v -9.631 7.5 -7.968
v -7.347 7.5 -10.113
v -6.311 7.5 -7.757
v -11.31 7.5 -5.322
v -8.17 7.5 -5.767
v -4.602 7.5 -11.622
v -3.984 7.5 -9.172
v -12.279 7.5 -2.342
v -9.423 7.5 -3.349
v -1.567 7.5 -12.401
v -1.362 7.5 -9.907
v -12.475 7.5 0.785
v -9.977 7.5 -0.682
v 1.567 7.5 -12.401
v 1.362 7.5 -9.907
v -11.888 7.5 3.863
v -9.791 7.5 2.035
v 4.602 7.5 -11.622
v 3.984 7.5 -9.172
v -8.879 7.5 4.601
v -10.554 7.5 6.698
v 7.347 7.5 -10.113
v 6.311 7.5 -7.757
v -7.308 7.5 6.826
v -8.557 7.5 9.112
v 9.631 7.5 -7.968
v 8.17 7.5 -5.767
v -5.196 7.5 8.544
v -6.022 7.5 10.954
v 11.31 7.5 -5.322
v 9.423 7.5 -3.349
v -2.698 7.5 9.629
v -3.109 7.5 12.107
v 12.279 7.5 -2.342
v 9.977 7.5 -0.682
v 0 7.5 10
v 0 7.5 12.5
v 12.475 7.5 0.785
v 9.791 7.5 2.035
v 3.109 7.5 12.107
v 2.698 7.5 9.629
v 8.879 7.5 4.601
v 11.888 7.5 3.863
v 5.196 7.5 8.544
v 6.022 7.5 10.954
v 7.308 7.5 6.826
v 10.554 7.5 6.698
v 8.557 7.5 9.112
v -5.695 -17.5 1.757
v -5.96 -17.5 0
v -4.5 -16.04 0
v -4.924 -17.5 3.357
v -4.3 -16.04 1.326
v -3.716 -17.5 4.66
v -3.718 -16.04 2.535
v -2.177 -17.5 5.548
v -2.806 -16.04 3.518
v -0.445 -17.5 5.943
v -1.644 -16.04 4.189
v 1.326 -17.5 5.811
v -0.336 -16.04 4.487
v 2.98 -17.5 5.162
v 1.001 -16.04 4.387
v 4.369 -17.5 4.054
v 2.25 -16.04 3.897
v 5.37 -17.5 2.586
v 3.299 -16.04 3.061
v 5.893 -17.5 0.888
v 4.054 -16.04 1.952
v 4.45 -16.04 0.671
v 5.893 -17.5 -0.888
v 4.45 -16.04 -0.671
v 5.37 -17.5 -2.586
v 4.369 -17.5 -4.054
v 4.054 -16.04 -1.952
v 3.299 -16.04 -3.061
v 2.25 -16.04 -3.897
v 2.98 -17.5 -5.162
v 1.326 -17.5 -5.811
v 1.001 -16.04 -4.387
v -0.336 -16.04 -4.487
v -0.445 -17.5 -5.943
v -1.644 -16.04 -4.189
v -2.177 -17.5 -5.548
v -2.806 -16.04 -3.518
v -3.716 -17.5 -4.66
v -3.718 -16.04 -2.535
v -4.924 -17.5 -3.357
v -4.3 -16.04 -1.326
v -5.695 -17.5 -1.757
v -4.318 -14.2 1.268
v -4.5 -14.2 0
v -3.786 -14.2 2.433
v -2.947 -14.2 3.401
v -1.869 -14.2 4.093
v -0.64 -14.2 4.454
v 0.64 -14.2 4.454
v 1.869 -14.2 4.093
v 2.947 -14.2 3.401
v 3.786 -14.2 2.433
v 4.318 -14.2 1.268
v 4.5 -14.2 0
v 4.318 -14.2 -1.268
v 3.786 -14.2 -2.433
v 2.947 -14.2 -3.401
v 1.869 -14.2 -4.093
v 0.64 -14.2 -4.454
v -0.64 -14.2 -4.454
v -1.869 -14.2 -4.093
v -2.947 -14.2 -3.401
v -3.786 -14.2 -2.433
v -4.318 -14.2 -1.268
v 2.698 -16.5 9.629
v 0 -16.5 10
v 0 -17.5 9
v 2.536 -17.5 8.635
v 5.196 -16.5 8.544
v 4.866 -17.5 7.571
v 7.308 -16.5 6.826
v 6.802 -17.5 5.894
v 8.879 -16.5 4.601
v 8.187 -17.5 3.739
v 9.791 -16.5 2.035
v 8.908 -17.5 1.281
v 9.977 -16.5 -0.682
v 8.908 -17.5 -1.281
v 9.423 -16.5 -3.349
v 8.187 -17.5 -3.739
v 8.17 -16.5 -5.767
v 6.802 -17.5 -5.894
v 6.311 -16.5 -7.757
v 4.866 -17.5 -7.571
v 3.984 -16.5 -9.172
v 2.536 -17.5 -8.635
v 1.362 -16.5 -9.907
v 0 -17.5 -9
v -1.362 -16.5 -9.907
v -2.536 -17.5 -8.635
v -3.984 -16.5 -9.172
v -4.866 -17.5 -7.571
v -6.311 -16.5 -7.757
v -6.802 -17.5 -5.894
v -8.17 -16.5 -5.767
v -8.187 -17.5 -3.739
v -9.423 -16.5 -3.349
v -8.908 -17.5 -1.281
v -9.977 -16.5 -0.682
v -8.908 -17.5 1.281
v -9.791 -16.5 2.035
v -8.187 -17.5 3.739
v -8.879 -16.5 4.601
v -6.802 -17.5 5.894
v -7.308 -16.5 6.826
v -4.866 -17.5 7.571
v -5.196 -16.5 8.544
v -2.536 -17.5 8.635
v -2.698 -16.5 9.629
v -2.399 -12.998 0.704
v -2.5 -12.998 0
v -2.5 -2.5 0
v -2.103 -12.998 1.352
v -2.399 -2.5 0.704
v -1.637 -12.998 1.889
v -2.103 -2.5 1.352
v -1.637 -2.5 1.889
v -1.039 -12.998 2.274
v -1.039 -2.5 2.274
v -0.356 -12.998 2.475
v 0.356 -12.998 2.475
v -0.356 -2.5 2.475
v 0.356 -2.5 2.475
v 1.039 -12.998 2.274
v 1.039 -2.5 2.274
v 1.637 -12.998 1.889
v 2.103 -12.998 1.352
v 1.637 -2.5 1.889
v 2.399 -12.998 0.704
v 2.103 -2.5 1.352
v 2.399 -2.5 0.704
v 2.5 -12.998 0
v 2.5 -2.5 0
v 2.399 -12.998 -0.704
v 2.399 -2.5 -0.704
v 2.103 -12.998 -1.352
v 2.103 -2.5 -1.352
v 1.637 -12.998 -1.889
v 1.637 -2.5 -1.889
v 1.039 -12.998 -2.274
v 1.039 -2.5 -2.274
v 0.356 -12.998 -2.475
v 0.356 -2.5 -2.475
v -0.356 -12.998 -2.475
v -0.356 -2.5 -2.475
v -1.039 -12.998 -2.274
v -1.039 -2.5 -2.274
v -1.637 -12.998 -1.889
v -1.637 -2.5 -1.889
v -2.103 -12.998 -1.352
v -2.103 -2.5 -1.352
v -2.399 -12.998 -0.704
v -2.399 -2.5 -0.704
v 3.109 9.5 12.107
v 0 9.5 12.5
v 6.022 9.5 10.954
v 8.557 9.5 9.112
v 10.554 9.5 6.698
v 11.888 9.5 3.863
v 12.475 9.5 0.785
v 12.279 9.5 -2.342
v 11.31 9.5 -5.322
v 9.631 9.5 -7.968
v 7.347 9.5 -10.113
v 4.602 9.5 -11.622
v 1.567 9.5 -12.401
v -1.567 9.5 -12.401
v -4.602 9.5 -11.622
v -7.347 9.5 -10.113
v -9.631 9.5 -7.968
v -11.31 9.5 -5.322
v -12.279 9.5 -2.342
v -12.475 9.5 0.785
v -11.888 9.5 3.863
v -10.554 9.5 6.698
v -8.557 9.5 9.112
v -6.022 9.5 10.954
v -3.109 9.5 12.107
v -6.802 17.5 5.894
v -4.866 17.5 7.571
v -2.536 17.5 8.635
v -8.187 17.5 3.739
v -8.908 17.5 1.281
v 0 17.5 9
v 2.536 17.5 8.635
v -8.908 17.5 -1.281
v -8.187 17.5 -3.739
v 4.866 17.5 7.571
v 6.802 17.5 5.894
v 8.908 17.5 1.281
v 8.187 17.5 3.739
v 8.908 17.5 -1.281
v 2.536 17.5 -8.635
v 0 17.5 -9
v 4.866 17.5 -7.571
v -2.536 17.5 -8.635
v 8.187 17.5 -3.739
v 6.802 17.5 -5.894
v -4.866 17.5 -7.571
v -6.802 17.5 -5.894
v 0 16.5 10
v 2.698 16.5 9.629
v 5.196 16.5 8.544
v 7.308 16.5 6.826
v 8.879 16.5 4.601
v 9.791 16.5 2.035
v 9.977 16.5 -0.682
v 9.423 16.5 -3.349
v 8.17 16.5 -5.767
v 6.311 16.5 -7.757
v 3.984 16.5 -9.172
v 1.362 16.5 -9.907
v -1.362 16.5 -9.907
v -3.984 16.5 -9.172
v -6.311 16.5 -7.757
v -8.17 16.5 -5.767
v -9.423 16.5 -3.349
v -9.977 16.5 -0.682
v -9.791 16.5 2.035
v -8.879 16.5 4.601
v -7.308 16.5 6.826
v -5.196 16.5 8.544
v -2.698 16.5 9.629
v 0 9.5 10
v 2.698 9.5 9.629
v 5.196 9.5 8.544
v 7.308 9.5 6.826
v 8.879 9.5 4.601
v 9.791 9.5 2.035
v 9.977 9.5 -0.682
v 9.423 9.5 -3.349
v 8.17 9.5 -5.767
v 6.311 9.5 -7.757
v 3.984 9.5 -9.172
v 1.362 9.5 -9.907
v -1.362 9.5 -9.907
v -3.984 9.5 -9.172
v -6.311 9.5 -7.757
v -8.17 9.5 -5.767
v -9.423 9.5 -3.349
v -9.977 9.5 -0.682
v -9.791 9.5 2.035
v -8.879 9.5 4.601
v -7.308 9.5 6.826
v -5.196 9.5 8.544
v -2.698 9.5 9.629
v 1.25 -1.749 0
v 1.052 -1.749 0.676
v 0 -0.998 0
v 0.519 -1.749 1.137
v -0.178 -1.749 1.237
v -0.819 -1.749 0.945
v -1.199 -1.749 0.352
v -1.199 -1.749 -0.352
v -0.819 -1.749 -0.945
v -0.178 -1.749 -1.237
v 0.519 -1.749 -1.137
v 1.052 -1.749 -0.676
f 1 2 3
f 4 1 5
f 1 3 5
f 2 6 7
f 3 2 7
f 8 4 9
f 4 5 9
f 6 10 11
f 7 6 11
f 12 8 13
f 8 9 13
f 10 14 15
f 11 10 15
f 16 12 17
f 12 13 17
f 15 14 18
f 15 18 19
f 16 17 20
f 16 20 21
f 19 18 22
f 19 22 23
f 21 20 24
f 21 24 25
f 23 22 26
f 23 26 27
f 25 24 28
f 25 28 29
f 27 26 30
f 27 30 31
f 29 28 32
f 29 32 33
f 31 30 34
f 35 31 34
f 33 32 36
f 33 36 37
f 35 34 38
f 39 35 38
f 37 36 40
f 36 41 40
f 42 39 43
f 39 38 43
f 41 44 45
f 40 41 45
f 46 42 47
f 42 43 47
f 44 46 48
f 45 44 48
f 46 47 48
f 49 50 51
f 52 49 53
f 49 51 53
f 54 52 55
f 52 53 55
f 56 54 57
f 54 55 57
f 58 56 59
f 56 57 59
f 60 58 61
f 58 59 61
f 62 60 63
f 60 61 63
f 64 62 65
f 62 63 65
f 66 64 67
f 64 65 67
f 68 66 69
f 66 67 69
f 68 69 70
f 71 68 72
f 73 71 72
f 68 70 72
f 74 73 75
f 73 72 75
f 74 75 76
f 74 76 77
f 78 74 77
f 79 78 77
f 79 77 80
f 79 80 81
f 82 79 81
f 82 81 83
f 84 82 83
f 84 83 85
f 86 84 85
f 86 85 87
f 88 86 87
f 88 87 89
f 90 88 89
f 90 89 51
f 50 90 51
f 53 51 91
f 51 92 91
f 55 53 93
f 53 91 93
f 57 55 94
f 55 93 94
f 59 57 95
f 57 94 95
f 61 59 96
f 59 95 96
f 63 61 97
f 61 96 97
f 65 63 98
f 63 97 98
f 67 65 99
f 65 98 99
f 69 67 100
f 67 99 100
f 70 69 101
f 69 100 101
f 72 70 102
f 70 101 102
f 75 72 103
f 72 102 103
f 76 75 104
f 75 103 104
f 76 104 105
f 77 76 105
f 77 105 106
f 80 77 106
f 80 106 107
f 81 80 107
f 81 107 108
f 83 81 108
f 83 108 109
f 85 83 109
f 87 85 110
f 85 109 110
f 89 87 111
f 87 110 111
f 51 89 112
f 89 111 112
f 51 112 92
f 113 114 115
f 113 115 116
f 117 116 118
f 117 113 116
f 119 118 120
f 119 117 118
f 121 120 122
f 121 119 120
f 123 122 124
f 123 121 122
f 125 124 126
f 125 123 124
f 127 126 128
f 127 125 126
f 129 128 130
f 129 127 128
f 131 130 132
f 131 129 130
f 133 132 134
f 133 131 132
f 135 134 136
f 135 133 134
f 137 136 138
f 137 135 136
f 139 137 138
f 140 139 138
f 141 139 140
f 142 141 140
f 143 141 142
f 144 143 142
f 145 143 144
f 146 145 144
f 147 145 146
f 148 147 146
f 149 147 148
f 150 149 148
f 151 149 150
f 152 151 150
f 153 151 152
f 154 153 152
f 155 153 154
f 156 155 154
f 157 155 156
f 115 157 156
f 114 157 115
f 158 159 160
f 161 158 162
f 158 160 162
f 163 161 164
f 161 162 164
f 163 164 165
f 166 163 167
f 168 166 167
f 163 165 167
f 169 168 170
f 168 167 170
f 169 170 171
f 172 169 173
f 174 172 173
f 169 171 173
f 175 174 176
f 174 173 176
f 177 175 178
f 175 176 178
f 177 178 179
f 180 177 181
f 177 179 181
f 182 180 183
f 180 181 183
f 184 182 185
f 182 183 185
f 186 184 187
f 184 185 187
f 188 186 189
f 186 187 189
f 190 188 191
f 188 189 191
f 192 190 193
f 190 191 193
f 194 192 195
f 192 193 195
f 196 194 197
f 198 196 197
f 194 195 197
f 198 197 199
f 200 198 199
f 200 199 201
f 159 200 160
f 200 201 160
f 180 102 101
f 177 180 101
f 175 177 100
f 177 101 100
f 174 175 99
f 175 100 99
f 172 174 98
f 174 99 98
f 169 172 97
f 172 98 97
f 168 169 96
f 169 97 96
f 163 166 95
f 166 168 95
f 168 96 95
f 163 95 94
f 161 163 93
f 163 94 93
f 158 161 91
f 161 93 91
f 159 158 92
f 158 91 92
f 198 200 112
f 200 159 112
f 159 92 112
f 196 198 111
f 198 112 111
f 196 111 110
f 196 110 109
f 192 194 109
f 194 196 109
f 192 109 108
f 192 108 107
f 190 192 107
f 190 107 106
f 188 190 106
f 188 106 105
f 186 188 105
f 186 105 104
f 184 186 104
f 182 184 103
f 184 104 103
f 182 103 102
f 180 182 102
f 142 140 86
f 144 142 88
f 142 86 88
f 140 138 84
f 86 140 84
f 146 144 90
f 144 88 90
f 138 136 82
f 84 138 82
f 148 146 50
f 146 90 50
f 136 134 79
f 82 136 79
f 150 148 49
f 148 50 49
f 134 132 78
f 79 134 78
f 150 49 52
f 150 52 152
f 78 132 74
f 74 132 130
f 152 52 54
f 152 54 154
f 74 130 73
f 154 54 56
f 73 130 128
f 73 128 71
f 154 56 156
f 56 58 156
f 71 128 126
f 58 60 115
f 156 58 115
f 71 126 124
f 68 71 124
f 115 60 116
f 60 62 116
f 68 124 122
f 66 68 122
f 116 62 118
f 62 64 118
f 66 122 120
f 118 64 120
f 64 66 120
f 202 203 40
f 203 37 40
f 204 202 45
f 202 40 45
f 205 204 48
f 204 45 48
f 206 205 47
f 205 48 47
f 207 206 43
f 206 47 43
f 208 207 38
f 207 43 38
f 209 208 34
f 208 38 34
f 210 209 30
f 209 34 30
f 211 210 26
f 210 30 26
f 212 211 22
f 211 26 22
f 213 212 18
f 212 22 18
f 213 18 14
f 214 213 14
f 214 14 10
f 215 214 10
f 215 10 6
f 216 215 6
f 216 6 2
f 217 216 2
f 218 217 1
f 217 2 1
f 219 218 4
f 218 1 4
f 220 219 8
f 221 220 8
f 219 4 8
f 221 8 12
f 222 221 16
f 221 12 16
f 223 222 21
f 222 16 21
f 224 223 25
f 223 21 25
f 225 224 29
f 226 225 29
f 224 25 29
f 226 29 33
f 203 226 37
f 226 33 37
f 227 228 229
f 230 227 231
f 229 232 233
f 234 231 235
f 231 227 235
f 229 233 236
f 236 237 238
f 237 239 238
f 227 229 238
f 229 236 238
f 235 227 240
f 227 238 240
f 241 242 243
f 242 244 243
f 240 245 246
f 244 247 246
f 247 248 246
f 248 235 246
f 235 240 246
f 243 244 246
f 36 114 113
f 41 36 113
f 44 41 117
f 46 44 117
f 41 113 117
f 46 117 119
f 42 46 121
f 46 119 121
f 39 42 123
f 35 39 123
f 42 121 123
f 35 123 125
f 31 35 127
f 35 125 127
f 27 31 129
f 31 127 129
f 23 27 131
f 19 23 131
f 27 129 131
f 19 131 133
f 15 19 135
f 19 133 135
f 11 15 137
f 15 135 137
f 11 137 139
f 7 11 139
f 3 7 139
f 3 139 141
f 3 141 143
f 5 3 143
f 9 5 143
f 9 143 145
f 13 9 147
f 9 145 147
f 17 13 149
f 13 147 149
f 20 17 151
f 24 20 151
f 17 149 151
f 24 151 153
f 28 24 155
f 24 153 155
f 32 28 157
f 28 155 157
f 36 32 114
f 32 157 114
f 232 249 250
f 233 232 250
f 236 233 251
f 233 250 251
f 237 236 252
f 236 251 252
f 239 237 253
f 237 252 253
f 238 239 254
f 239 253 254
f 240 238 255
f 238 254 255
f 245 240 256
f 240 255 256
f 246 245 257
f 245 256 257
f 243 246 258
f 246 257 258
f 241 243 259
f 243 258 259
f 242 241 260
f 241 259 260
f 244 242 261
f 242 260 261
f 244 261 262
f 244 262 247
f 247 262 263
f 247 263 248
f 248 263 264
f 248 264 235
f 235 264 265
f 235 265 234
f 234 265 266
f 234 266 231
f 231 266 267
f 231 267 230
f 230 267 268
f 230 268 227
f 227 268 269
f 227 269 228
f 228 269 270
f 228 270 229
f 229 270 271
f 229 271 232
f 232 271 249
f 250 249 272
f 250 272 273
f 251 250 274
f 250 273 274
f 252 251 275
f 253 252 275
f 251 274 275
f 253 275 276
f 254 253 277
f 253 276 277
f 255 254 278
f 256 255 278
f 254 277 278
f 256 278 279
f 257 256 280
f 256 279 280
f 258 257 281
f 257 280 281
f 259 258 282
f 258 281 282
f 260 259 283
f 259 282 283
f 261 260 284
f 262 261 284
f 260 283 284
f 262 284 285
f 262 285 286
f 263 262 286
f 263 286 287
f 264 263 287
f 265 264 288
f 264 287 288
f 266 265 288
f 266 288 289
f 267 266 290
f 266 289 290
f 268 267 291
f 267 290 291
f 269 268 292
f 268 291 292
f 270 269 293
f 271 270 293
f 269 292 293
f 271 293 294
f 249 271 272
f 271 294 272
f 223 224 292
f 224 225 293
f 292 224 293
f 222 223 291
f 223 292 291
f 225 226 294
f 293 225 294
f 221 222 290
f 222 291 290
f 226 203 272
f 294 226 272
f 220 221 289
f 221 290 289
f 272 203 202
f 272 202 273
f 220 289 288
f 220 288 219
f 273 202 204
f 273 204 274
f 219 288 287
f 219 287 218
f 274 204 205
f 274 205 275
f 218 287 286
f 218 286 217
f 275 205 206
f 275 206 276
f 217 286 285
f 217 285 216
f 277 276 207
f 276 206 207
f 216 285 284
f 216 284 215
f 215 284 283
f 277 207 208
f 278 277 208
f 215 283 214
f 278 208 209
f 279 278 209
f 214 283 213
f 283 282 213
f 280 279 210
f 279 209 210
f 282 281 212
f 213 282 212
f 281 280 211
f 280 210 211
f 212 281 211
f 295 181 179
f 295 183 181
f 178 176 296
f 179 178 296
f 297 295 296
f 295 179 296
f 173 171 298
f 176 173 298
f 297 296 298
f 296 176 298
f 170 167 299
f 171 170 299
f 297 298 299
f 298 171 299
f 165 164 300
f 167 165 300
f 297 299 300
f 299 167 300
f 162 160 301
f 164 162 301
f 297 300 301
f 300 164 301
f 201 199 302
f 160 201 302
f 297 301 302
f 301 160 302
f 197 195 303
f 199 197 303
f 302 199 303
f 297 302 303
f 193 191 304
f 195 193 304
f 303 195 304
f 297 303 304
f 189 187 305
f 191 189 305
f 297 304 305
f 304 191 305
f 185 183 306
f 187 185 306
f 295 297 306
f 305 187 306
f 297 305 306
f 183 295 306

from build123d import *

# Parameters (mm, degrees)
F2_SIZE        = 1
F4_D           = 5
F4_DEPTH       = 15
F4_TIP         = 1.5021515476
F7_D           = 9
F7_DEPTH       = 6.3
F7_CSINK_D     = 17.92
F7_CSINK_ANGLE = 90
F7_TIP         = 2.7038727856


with BuildPart() as f1:
    # F0 (on Right) → F1 (revolve)
    with BuildSketch(Plane.YZ):
        Polygon((-17.5, 10), (-17.5, 0), (17.5, 0), (17.5, 10), (9.5, 10), (9.5, 12.5), (7.5, 12.5), (7.5, 10), align=None)
    revolve(axis=Axis((0, 0, 0), (0, 1, 0)))

    # F2
    f2_edges = [f1.edges().sort_by_distance(p)[0] for p in [
        (0, 17.5, -10),
        (0, -17.5, -10),
    ]]
    chamfer(f2_edges, length=F2_SIZE)

    # F4
    with Locations(Plane.XZ.offset(17.5)):
        with Locations((0, 0)):
            Hole(F4_D / 2, depth=F4_DEPTH)
            with Locations((0, 0, -(F4_DEPTH + F4_TIP / 2))):  # 118° drill point
                Cone(0, F4_D / 2, F4_TIP, mode=Mode.SUBTRACT)

    # F7
    with Locations(Plane.XZ.offset(20.5)):
        with Locations((0, 0)):
            CounterSinkHole(F7_D / 2, F7_CSINK_D / 2, depth=F7_DEPTH, counter_sink_angle=F7_CSINK_ANGLE)
            with Locations((0, 0, -(F7_DEPTH + F7_TIP / 2))):  # 118° drill point
                Cone(0, F7_D / 2, F7_TIP, mode=Mode.SUBTRACT)


solid = f1.part
